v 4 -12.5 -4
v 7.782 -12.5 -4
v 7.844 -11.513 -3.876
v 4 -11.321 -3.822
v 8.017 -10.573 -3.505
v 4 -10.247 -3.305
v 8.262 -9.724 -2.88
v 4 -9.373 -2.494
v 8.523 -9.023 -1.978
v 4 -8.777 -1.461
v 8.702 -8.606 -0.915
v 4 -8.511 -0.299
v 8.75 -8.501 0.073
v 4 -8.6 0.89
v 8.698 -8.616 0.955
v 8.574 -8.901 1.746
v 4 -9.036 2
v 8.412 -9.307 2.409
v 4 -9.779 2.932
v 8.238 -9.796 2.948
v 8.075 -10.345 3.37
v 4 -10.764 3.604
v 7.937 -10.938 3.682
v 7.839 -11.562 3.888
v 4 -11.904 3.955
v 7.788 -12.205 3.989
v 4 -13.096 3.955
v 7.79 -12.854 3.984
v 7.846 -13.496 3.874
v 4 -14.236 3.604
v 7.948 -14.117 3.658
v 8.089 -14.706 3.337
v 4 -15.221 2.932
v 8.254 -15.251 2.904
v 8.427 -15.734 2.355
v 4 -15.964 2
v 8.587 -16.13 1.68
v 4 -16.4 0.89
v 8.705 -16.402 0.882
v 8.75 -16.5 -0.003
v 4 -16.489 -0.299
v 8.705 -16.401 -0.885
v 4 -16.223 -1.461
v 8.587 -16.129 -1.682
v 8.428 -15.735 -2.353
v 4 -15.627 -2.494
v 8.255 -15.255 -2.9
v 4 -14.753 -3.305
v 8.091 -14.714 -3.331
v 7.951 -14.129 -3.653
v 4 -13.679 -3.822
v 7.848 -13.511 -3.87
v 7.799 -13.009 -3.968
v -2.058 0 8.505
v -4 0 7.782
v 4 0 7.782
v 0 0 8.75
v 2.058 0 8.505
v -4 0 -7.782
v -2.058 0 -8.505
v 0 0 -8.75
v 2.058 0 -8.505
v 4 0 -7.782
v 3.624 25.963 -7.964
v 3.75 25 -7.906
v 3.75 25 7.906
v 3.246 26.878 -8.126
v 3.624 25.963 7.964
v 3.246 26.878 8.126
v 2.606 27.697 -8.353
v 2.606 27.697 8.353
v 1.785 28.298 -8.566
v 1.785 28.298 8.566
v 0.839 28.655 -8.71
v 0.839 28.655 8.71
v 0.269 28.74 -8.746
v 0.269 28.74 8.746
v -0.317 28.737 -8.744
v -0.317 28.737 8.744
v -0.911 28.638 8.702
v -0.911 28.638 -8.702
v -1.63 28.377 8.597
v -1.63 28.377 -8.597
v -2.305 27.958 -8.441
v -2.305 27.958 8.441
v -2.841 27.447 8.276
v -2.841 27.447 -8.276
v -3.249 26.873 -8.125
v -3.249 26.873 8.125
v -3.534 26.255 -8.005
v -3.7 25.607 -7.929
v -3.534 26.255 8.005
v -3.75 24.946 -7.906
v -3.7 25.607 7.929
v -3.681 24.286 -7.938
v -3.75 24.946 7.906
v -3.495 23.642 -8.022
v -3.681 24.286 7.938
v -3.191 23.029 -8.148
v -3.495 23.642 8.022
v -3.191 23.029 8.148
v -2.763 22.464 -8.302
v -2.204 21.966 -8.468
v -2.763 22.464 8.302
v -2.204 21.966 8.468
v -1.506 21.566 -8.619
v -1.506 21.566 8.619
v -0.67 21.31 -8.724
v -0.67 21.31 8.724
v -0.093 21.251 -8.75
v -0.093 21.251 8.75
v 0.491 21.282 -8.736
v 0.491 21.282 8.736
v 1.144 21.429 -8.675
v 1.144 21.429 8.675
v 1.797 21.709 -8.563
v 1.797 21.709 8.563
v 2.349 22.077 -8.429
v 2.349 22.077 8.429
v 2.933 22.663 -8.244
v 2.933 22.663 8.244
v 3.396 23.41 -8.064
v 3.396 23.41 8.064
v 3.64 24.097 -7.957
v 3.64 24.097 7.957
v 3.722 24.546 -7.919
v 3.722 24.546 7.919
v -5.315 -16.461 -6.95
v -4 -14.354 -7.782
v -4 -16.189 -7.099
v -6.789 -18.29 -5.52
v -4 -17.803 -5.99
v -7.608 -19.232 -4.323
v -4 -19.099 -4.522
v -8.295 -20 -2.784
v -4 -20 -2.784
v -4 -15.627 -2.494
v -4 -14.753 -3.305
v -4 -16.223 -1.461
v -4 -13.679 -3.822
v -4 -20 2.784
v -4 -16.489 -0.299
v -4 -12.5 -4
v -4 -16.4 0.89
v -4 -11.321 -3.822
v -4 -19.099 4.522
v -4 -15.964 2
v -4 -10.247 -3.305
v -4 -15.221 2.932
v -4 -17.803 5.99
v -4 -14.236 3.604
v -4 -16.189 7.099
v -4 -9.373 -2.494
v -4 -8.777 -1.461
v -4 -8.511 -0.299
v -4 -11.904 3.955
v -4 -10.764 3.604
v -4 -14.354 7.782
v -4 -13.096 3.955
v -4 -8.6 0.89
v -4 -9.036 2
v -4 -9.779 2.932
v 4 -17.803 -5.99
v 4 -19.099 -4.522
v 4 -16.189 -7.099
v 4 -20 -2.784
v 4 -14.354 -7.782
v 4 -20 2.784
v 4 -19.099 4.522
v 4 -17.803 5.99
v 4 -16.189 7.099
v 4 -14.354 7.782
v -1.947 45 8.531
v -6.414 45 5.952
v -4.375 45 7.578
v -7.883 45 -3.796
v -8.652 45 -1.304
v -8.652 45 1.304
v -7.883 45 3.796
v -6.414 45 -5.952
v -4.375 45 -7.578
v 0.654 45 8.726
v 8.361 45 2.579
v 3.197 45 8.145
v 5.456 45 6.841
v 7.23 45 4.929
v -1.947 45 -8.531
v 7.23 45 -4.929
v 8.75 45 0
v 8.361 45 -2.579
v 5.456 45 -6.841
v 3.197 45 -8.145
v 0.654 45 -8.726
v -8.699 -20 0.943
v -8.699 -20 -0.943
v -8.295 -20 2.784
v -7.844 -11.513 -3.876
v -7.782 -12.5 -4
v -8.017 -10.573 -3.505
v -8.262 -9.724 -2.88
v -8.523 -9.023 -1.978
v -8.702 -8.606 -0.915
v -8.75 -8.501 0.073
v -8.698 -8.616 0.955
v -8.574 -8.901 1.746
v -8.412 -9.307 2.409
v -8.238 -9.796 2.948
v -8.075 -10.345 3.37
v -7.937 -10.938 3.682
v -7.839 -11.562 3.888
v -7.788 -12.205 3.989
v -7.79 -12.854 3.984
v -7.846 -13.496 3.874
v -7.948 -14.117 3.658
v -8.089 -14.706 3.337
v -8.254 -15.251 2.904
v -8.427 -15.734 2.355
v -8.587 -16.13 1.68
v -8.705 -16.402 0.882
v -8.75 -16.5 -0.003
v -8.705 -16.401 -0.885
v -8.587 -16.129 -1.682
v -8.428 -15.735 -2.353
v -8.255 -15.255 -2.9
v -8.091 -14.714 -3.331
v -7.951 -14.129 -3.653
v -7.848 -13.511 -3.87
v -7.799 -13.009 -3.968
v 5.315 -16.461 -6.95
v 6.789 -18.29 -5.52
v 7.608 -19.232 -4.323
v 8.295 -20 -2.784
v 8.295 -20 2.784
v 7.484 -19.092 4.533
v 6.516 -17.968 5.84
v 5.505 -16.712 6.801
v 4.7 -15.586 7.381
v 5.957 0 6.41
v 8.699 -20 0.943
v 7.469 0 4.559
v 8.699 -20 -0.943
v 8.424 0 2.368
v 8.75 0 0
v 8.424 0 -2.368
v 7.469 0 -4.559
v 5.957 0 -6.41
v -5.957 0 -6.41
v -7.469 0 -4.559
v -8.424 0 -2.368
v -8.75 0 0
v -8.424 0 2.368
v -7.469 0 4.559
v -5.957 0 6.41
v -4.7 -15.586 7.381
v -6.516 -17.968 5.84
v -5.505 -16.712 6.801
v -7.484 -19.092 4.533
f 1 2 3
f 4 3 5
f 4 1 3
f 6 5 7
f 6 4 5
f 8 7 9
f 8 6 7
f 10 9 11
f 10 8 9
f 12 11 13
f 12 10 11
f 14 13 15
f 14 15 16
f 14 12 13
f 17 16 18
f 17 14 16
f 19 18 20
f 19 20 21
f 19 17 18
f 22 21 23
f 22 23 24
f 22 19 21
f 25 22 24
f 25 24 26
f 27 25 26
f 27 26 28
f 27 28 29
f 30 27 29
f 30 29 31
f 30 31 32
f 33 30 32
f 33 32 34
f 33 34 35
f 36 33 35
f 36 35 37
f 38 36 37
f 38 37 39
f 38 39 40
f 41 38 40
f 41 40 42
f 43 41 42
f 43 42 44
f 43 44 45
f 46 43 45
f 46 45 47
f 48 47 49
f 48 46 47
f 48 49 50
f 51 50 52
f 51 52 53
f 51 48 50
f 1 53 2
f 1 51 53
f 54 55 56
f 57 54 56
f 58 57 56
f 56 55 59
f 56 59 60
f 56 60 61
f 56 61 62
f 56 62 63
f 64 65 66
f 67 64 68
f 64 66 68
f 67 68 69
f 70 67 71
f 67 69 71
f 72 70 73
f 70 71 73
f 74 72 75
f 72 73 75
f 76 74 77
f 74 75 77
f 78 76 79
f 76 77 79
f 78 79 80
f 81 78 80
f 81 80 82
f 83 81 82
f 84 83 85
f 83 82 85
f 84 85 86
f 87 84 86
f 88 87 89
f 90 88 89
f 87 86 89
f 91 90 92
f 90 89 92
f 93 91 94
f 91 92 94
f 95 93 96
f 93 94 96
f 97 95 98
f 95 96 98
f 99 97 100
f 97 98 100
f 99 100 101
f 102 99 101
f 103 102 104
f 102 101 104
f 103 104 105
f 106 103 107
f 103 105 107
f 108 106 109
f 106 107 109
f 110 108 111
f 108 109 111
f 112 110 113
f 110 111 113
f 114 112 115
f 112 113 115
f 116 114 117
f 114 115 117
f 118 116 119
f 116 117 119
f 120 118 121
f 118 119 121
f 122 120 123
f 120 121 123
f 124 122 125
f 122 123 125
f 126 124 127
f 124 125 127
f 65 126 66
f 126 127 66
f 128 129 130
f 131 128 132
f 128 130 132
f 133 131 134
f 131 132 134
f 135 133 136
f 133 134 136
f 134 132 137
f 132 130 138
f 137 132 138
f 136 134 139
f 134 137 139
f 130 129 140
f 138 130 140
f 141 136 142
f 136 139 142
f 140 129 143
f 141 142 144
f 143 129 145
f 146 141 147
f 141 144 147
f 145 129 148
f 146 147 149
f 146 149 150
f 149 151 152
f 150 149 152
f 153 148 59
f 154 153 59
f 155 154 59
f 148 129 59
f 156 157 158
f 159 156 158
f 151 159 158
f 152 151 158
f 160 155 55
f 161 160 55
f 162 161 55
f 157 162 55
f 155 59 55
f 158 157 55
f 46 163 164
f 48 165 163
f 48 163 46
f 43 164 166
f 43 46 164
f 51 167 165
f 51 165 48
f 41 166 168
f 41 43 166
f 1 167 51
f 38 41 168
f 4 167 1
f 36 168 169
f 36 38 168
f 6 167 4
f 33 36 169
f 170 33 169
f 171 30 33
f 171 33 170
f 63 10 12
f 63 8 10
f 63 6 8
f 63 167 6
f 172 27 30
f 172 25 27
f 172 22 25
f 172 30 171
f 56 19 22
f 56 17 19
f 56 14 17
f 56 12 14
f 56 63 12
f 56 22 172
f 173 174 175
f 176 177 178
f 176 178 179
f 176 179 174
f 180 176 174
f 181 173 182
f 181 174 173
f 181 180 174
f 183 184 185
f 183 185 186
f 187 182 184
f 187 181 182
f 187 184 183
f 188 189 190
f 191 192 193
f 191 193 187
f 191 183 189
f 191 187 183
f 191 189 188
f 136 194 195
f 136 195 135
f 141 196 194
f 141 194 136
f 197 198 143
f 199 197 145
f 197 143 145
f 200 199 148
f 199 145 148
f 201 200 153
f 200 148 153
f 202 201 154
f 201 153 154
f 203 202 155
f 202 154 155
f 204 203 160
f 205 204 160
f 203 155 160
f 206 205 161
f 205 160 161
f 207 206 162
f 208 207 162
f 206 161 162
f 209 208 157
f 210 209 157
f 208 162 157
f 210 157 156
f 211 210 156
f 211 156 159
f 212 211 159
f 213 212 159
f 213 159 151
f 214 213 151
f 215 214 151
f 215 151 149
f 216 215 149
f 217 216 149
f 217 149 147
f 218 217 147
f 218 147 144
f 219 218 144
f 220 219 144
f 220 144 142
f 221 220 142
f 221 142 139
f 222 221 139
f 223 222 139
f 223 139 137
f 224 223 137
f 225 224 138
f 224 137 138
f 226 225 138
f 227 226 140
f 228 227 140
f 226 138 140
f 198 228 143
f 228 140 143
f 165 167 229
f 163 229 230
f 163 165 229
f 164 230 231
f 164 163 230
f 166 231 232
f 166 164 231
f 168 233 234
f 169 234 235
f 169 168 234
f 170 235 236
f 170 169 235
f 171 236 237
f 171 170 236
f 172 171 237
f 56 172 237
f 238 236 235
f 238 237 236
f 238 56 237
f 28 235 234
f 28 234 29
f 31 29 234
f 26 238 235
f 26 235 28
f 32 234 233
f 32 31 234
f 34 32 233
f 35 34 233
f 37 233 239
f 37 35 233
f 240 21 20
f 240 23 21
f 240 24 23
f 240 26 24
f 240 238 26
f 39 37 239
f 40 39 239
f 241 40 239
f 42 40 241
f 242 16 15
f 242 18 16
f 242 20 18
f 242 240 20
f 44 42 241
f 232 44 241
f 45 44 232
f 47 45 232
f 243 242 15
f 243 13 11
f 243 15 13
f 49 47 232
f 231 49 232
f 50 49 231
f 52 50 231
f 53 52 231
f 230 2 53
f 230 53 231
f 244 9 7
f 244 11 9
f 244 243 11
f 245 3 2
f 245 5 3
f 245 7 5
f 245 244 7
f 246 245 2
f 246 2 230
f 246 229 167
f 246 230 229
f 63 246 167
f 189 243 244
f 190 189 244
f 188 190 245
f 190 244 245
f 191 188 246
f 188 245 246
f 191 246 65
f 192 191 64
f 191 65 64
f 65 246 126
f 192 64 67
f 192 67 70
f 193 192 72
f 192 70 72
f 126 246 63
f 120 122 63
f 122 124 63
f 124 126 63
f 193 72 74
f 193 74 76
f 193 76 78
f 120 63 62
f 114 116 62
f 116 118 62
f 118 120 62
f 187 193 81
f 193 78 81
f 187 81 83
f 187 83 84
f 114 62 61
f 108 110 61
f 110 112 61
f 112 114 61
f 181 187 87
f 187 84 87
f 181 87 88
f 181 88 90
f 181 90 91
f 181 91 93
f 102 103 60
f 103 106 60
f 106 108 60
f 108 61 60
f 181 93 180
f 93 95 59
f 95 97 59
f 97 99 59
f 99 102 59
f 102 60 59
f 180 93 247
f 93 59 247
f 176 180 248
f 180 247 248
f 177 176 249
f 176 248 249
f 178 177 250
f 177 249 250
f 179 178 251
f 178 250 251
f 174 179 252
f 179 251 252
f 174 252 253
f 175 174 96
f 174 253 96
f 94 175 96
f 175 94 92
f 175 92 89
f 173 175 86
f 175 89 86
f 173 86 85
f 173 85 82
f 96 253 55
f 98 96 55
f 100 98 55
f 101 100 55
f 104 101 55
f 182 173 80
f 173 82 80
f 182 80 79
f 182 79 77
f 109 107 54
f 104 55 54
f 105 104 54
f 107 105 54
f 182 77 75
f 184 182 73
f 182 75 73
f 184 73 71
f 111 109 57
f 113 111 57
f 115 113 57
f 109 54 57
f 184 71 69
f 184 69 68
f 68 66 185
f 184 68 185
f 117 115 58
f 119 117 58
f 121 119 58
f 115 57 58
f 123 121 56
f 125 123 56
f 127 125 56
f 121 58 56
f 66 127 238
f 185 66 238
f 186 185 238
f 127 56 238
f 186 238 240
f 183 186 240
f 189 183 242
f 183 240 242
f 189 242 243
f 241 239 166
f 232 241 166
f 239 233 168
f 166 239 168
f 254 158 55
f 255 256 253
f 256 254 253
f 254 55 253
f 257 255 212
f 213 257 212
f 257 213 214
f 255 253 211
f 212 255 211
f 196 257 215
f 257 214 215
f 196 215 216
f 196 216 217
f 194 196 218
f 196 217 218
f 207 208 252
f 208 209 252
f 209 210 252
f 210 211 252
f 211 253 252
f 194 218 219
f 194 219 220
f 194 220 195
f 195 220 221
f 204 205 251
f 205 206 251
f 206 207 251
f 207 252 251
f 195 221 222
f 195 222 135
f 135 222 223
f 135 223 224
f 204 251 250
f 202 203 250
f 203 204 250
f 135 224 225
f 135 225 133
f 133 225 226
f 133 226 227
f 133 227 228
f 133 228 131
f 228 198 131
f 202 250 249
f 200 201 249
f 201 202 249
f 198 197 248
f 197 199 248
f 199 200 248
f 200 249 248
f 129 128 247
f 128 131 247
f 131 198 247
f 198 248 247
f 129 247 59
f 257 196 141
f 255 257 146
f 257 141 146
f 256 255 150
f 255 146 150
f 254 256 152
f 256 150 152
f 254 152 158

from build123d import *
from build123d.topology import SkipClean

# Parameters (mm, degrees)
SKETCH1_R               = 8.75
BOSS_EXTRUDE1_DEPTH     = 45
BOSS_EXTRUDE2_START     = 20
BOSS_EXTRUDE2_DEPTH     = 20
CUT_EXTRUDE2_DEPTH      = 15
CUT_EXTRUDE2_DEPTH_BACK = 15
SKETCH3_R               = 4
CUT_EXTRUDE3_DEPTH      = 15
CUT_EXTRUDE3_DEPTH_BACK = 15
SKETCH4_R               = 3.75


with BuildPart() as part:
    # Sketch1 → Boss-Extrude1 (new body)
    with BuildSketch(Plane(origin=(0, 0, 0), x_dir=(1, 0, 0), z_dir=(0, 1, 0))):
        Circle(SKETCH1_R)
    extrude(amount=BOSS_EXTRUDE1_DEPTH)

    # Sketch2 → Boss-Extrude2 (add)
    with SkipClean():  # the faces are left unmerged after this step: merging them gives an invalid solid
        with BuildSketch(Plane.XZ.offset(BOSS_EXTRUDE2_START)):
            with BuildLine():
                Line((-4, -7.782191208), (-4, 7.782191208))
                ThreePointArc((-4, 7.782191208), (-8.75, 0), (-4, -7.782191208))
            make_face()
            with BuildLine():
                Line((4, -7.782191208), (4, 7.782191208))
                ThreePointArc((4, 7.782191208), (8.75, 0), (4, -7.782191208))
            make_face()
        extrude(amount=-BOSS_EXTRUDE2_DEPTH)

    # Sketch3 → Cut-Extrude2 (cut, two sides: drawn at the far end of the back side and taken through both)
    with SkipClean():  # the faces are left unmerged after this step: merging them gives an invalid solid
        with BuildSketch(Plane(origin=(0, 0, 0), x_dir=(0, 0, -1), z_dir=(1, 0, 0)).offset(-CUT_EXTRUDE2_DEPTH_BACK)):
            with Locations((0, -12.5)):
                Circle(SKETCH3_R)
            with BuildLine():
                Line((-8, -12.5), (-11.944744316, -12.5))
                Line((-11.944744316, -12.5), (-11.944744316, -23.565322798))
                Line((-11.944744316, -23.565322798), (12.069953463, -23.565322798))
                Line((12.069953463, -23.565322798), (12.069953463, -12.5))
                Line((12.069953463, -12.5), (8, -12.5))
                ThreePointArc((8, -12.5), (0, -20.5), (-8, -12.5))
            make_face()
        extrude(amount=CUT_EXTRUDE2_DEPTH + CUT_EXTRUDE2_DEPTH_BACK, mode=Mode.SUBTRACT)

    # Sketch4 → Cut-Extrude3 (cut, two sides: drawn at the far end of the back side and taken through both)
    with SkipClean():  # the faces are left unmerged after this step: merging them gives an invalid solid
        with BuildSketch(Plane.XY.offset(-CUT_EXTRUDE3_DEPTH_BACK)):
            with Locations((0, 25)):
                Circle(SKETCH4_R)
        extrude(amount=CUT_EXTRUDE3_DEPTH + CUT_EXTRUDE3_DEPTH_BACK, mode=Mode.SUBTRACT)


solid = part.part
